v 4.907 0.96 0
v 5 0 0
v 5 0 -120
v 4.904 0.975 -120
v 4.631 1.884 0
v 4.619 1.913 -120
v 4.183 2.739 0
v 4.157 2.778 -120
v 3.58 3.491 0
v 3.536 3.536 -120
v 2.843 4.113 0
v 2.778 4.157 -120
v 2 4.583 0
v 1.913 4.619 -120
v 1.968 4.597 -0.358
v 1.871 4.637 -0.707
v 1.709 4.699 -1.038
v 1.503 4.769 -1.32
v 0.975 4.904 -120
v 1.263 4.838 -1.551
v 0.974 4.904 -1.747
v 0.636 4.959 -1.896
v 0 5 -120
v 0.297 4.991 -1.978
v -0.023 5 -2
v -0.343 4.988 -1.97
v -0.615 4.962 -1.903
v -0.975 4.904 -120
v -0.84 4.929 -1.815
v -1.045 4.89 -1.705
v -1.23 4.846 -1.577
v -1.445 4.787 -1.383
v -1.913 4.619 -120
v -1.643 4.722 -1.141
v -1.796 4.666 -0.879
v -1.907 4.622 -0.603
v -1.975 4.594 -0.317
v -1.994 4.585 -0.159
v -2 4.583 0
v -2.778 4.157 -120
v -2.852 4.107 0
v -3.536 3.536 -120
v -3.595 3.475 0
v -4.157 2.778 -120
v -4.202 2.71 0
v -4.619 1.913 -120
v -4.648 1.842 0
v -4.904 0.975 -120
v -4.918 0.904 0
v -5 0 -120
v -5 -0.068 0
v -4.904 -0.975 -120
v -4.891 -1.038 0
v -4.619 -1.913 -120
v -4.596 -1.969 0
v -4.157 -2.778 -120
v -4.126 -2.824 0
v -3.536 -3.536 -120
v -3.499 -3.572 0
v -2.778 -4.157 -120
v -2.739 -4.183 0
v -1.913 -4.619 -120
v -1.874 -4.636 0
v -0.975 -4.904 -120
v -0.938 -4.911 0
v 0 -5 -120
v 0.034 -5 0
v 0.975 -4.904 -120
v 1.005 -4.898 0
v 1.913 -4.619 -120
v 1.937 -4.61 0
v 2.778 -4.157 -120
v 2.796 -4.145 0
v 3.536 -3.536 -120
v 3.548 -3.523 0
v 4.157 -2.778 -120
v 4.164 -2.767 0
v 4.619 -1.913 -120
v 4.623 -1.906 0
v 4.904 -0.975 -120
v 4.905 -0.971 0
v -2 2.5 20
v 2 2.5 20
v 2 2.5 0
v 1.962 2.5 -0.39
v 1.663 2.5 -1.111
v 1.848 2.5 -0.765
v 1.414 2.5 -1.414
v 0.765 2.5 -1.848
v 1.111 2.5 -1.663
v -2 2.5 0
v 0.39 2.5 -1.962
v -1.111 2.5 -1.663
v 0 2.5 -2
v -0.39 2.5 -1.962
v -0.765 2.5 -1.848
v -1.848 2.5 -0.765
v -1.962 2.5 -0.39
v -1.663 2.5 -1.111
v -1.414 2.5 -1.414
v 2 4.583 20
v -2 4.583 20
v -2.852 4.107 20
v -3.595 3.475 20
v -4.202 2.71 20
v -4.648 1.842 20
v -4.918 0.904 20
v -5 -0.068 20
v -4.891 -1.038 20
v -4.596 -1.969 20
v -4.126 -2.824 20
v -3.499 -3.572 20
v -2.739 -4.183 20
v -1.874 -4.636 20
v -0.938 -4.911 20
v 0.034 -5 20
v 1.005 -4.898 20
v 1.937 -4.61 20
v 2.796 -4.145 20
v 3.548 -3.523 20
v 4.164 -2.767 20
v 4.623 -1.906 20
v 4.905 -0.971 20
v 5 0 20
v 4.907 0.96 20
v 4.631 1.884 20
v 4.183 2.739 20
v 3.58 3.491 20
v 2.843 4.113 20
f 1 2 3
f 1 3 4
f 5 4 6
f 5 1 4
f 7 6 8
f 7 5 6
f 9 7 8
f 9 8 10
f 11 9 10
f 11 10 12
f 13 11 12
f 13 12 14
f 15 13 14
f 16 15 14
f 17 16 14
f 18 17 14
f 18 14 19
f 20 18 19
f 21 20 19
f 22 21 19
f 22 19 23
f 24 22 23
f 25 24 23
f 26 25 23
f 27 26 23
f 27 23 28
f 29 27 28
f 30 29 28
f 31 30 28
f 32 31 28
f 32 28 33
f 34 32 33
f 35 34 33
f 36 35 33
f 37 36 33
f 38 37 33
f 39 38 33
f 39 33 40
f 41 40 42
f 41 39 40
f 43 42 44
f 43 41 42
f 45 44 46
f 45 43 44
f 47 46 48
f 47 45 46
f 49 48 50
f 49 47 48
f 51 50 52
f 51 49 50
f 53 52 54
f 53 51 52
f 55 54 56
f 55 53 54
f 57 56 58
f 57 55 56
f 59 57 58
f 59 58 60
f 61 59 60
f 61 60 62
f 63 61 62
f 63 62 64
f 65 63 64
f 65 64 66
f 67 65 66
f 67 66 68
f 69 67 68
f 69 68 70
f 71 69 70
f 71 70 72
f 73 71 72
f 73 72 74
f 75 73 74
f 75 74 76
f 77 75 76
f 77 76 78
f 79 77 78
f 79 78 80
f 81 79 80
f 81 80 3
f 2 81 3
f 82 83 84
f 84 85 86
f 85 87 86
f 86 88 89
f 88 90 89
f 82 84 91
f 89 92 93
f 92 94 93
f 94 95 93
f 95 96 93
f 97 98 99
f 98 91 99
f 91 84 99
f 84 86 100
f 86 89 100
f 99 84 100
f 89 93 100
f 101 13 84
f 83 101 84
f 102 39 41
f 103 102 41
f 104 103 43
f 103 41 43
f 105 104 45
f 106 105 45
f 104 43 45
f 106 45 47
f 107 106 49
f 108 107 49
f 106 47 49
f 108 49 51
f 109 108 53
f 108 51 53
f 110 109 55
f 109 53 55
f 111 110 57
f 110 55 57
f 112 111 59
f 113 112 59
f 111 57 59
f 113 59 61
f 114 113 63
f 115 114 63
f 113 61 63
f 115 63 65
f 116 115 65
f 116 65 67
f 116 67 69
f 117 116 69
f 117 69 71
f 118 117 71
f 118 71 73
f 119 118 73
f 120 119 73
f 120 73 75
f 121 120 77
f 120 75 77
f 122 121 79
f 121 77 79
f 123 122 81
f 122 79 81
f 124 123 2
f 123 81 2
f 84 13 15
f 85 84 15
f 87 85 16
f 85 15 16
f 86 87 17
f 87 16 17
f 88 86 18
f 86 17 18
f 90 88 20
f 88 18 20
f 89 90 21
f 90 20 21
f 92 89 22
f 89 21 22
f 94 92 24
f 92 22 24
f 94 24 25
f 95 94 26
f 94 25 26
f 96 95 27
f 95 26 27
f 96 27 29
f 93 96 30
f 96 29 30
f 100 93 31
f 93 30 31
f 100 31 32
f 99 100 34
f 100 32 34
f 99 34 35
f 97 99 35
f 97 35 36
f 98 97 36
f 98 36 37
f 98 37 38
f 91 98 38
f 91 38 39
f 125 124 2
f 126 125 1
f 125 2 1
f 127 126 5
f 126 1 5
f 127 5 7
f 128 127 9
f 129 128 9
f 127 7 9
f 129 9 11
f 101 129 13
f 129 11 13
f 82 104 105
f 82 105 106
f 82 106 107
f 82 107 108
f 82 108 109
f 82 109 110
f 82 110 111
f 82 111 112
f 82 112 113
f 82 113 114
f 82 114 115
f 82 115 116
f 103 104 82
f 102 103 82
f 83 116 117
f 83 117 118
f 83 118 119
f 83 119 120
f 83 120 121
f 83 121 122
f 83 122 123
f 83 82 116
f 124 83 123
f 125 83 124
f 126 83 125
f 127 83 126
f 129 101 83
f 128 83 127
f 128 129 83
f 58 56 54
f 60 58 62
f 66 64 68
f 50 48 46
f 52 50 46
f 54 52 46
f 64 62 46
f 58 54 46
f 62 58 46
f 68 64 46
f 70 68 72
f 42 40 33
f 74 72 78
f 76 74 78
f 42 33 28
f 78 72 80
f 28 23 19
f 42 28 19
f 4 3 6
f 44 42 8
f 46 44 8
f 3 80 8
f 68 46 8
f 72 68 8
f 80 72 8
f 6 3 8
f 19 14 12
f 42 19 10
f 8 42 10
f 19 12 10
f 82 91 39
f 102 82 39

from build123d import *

# Parameters (mm, degrees)
BOSS_EXTRUDE1_DEPTH = 20
BOSS_EXTRUDE2_START = -120
SKETCH1_3_R         = 5
BOSS_EXTRUDE2_DEPTH = 120
SKETCH4_W           = 2
SKETCH4_H           = 2.701125373


with BuildPart() as part:
    # Sketch1 → Boss-Extrude1 (new body)
    with BuildSketch(Plane.XY):
        with BuildLine():
            Line((2, 2.5), (0, 2.5))
            Line((0, 2.5), (-2, 2.5))
            Line((-2, 2.5), (-2, 4.582575695))
            ThreePointArc((-2, 4.582575695), (-2.738612788, -4.183300133), (5, 0))
            ThreePointArc((5, 0), (4.183300133, 2.738612788), (2, 4.582575695))
            Line((2, 4.582575695), (2, 2.5))
        make_face()
    extrude(amount=BOSS_EXTRUDE1_DEPTH)

    # Sketch1<3> → Boss-Extrude2 (add)
    with BuildSketch(Plane.XY.offset(BOSS_EXTRUDE2_START)):
        Circle(SKETCH1_3_R)
    extrude(amount=BOSS_EXTRUDE2_DEPTH)

    # Sketch4 → Cut-Revolve2 (revolve, cut)
    with BuildSketch(Plane.XY):
        with Locations((1, 3.850562686)):
            Rectangle(SKETCH4_W, SKETCH4_H)
    revolve(axis=Axis((0, 0, 0), (0, 1, 0)), mode=Mode.SUBTRACT)


solid = part.part
